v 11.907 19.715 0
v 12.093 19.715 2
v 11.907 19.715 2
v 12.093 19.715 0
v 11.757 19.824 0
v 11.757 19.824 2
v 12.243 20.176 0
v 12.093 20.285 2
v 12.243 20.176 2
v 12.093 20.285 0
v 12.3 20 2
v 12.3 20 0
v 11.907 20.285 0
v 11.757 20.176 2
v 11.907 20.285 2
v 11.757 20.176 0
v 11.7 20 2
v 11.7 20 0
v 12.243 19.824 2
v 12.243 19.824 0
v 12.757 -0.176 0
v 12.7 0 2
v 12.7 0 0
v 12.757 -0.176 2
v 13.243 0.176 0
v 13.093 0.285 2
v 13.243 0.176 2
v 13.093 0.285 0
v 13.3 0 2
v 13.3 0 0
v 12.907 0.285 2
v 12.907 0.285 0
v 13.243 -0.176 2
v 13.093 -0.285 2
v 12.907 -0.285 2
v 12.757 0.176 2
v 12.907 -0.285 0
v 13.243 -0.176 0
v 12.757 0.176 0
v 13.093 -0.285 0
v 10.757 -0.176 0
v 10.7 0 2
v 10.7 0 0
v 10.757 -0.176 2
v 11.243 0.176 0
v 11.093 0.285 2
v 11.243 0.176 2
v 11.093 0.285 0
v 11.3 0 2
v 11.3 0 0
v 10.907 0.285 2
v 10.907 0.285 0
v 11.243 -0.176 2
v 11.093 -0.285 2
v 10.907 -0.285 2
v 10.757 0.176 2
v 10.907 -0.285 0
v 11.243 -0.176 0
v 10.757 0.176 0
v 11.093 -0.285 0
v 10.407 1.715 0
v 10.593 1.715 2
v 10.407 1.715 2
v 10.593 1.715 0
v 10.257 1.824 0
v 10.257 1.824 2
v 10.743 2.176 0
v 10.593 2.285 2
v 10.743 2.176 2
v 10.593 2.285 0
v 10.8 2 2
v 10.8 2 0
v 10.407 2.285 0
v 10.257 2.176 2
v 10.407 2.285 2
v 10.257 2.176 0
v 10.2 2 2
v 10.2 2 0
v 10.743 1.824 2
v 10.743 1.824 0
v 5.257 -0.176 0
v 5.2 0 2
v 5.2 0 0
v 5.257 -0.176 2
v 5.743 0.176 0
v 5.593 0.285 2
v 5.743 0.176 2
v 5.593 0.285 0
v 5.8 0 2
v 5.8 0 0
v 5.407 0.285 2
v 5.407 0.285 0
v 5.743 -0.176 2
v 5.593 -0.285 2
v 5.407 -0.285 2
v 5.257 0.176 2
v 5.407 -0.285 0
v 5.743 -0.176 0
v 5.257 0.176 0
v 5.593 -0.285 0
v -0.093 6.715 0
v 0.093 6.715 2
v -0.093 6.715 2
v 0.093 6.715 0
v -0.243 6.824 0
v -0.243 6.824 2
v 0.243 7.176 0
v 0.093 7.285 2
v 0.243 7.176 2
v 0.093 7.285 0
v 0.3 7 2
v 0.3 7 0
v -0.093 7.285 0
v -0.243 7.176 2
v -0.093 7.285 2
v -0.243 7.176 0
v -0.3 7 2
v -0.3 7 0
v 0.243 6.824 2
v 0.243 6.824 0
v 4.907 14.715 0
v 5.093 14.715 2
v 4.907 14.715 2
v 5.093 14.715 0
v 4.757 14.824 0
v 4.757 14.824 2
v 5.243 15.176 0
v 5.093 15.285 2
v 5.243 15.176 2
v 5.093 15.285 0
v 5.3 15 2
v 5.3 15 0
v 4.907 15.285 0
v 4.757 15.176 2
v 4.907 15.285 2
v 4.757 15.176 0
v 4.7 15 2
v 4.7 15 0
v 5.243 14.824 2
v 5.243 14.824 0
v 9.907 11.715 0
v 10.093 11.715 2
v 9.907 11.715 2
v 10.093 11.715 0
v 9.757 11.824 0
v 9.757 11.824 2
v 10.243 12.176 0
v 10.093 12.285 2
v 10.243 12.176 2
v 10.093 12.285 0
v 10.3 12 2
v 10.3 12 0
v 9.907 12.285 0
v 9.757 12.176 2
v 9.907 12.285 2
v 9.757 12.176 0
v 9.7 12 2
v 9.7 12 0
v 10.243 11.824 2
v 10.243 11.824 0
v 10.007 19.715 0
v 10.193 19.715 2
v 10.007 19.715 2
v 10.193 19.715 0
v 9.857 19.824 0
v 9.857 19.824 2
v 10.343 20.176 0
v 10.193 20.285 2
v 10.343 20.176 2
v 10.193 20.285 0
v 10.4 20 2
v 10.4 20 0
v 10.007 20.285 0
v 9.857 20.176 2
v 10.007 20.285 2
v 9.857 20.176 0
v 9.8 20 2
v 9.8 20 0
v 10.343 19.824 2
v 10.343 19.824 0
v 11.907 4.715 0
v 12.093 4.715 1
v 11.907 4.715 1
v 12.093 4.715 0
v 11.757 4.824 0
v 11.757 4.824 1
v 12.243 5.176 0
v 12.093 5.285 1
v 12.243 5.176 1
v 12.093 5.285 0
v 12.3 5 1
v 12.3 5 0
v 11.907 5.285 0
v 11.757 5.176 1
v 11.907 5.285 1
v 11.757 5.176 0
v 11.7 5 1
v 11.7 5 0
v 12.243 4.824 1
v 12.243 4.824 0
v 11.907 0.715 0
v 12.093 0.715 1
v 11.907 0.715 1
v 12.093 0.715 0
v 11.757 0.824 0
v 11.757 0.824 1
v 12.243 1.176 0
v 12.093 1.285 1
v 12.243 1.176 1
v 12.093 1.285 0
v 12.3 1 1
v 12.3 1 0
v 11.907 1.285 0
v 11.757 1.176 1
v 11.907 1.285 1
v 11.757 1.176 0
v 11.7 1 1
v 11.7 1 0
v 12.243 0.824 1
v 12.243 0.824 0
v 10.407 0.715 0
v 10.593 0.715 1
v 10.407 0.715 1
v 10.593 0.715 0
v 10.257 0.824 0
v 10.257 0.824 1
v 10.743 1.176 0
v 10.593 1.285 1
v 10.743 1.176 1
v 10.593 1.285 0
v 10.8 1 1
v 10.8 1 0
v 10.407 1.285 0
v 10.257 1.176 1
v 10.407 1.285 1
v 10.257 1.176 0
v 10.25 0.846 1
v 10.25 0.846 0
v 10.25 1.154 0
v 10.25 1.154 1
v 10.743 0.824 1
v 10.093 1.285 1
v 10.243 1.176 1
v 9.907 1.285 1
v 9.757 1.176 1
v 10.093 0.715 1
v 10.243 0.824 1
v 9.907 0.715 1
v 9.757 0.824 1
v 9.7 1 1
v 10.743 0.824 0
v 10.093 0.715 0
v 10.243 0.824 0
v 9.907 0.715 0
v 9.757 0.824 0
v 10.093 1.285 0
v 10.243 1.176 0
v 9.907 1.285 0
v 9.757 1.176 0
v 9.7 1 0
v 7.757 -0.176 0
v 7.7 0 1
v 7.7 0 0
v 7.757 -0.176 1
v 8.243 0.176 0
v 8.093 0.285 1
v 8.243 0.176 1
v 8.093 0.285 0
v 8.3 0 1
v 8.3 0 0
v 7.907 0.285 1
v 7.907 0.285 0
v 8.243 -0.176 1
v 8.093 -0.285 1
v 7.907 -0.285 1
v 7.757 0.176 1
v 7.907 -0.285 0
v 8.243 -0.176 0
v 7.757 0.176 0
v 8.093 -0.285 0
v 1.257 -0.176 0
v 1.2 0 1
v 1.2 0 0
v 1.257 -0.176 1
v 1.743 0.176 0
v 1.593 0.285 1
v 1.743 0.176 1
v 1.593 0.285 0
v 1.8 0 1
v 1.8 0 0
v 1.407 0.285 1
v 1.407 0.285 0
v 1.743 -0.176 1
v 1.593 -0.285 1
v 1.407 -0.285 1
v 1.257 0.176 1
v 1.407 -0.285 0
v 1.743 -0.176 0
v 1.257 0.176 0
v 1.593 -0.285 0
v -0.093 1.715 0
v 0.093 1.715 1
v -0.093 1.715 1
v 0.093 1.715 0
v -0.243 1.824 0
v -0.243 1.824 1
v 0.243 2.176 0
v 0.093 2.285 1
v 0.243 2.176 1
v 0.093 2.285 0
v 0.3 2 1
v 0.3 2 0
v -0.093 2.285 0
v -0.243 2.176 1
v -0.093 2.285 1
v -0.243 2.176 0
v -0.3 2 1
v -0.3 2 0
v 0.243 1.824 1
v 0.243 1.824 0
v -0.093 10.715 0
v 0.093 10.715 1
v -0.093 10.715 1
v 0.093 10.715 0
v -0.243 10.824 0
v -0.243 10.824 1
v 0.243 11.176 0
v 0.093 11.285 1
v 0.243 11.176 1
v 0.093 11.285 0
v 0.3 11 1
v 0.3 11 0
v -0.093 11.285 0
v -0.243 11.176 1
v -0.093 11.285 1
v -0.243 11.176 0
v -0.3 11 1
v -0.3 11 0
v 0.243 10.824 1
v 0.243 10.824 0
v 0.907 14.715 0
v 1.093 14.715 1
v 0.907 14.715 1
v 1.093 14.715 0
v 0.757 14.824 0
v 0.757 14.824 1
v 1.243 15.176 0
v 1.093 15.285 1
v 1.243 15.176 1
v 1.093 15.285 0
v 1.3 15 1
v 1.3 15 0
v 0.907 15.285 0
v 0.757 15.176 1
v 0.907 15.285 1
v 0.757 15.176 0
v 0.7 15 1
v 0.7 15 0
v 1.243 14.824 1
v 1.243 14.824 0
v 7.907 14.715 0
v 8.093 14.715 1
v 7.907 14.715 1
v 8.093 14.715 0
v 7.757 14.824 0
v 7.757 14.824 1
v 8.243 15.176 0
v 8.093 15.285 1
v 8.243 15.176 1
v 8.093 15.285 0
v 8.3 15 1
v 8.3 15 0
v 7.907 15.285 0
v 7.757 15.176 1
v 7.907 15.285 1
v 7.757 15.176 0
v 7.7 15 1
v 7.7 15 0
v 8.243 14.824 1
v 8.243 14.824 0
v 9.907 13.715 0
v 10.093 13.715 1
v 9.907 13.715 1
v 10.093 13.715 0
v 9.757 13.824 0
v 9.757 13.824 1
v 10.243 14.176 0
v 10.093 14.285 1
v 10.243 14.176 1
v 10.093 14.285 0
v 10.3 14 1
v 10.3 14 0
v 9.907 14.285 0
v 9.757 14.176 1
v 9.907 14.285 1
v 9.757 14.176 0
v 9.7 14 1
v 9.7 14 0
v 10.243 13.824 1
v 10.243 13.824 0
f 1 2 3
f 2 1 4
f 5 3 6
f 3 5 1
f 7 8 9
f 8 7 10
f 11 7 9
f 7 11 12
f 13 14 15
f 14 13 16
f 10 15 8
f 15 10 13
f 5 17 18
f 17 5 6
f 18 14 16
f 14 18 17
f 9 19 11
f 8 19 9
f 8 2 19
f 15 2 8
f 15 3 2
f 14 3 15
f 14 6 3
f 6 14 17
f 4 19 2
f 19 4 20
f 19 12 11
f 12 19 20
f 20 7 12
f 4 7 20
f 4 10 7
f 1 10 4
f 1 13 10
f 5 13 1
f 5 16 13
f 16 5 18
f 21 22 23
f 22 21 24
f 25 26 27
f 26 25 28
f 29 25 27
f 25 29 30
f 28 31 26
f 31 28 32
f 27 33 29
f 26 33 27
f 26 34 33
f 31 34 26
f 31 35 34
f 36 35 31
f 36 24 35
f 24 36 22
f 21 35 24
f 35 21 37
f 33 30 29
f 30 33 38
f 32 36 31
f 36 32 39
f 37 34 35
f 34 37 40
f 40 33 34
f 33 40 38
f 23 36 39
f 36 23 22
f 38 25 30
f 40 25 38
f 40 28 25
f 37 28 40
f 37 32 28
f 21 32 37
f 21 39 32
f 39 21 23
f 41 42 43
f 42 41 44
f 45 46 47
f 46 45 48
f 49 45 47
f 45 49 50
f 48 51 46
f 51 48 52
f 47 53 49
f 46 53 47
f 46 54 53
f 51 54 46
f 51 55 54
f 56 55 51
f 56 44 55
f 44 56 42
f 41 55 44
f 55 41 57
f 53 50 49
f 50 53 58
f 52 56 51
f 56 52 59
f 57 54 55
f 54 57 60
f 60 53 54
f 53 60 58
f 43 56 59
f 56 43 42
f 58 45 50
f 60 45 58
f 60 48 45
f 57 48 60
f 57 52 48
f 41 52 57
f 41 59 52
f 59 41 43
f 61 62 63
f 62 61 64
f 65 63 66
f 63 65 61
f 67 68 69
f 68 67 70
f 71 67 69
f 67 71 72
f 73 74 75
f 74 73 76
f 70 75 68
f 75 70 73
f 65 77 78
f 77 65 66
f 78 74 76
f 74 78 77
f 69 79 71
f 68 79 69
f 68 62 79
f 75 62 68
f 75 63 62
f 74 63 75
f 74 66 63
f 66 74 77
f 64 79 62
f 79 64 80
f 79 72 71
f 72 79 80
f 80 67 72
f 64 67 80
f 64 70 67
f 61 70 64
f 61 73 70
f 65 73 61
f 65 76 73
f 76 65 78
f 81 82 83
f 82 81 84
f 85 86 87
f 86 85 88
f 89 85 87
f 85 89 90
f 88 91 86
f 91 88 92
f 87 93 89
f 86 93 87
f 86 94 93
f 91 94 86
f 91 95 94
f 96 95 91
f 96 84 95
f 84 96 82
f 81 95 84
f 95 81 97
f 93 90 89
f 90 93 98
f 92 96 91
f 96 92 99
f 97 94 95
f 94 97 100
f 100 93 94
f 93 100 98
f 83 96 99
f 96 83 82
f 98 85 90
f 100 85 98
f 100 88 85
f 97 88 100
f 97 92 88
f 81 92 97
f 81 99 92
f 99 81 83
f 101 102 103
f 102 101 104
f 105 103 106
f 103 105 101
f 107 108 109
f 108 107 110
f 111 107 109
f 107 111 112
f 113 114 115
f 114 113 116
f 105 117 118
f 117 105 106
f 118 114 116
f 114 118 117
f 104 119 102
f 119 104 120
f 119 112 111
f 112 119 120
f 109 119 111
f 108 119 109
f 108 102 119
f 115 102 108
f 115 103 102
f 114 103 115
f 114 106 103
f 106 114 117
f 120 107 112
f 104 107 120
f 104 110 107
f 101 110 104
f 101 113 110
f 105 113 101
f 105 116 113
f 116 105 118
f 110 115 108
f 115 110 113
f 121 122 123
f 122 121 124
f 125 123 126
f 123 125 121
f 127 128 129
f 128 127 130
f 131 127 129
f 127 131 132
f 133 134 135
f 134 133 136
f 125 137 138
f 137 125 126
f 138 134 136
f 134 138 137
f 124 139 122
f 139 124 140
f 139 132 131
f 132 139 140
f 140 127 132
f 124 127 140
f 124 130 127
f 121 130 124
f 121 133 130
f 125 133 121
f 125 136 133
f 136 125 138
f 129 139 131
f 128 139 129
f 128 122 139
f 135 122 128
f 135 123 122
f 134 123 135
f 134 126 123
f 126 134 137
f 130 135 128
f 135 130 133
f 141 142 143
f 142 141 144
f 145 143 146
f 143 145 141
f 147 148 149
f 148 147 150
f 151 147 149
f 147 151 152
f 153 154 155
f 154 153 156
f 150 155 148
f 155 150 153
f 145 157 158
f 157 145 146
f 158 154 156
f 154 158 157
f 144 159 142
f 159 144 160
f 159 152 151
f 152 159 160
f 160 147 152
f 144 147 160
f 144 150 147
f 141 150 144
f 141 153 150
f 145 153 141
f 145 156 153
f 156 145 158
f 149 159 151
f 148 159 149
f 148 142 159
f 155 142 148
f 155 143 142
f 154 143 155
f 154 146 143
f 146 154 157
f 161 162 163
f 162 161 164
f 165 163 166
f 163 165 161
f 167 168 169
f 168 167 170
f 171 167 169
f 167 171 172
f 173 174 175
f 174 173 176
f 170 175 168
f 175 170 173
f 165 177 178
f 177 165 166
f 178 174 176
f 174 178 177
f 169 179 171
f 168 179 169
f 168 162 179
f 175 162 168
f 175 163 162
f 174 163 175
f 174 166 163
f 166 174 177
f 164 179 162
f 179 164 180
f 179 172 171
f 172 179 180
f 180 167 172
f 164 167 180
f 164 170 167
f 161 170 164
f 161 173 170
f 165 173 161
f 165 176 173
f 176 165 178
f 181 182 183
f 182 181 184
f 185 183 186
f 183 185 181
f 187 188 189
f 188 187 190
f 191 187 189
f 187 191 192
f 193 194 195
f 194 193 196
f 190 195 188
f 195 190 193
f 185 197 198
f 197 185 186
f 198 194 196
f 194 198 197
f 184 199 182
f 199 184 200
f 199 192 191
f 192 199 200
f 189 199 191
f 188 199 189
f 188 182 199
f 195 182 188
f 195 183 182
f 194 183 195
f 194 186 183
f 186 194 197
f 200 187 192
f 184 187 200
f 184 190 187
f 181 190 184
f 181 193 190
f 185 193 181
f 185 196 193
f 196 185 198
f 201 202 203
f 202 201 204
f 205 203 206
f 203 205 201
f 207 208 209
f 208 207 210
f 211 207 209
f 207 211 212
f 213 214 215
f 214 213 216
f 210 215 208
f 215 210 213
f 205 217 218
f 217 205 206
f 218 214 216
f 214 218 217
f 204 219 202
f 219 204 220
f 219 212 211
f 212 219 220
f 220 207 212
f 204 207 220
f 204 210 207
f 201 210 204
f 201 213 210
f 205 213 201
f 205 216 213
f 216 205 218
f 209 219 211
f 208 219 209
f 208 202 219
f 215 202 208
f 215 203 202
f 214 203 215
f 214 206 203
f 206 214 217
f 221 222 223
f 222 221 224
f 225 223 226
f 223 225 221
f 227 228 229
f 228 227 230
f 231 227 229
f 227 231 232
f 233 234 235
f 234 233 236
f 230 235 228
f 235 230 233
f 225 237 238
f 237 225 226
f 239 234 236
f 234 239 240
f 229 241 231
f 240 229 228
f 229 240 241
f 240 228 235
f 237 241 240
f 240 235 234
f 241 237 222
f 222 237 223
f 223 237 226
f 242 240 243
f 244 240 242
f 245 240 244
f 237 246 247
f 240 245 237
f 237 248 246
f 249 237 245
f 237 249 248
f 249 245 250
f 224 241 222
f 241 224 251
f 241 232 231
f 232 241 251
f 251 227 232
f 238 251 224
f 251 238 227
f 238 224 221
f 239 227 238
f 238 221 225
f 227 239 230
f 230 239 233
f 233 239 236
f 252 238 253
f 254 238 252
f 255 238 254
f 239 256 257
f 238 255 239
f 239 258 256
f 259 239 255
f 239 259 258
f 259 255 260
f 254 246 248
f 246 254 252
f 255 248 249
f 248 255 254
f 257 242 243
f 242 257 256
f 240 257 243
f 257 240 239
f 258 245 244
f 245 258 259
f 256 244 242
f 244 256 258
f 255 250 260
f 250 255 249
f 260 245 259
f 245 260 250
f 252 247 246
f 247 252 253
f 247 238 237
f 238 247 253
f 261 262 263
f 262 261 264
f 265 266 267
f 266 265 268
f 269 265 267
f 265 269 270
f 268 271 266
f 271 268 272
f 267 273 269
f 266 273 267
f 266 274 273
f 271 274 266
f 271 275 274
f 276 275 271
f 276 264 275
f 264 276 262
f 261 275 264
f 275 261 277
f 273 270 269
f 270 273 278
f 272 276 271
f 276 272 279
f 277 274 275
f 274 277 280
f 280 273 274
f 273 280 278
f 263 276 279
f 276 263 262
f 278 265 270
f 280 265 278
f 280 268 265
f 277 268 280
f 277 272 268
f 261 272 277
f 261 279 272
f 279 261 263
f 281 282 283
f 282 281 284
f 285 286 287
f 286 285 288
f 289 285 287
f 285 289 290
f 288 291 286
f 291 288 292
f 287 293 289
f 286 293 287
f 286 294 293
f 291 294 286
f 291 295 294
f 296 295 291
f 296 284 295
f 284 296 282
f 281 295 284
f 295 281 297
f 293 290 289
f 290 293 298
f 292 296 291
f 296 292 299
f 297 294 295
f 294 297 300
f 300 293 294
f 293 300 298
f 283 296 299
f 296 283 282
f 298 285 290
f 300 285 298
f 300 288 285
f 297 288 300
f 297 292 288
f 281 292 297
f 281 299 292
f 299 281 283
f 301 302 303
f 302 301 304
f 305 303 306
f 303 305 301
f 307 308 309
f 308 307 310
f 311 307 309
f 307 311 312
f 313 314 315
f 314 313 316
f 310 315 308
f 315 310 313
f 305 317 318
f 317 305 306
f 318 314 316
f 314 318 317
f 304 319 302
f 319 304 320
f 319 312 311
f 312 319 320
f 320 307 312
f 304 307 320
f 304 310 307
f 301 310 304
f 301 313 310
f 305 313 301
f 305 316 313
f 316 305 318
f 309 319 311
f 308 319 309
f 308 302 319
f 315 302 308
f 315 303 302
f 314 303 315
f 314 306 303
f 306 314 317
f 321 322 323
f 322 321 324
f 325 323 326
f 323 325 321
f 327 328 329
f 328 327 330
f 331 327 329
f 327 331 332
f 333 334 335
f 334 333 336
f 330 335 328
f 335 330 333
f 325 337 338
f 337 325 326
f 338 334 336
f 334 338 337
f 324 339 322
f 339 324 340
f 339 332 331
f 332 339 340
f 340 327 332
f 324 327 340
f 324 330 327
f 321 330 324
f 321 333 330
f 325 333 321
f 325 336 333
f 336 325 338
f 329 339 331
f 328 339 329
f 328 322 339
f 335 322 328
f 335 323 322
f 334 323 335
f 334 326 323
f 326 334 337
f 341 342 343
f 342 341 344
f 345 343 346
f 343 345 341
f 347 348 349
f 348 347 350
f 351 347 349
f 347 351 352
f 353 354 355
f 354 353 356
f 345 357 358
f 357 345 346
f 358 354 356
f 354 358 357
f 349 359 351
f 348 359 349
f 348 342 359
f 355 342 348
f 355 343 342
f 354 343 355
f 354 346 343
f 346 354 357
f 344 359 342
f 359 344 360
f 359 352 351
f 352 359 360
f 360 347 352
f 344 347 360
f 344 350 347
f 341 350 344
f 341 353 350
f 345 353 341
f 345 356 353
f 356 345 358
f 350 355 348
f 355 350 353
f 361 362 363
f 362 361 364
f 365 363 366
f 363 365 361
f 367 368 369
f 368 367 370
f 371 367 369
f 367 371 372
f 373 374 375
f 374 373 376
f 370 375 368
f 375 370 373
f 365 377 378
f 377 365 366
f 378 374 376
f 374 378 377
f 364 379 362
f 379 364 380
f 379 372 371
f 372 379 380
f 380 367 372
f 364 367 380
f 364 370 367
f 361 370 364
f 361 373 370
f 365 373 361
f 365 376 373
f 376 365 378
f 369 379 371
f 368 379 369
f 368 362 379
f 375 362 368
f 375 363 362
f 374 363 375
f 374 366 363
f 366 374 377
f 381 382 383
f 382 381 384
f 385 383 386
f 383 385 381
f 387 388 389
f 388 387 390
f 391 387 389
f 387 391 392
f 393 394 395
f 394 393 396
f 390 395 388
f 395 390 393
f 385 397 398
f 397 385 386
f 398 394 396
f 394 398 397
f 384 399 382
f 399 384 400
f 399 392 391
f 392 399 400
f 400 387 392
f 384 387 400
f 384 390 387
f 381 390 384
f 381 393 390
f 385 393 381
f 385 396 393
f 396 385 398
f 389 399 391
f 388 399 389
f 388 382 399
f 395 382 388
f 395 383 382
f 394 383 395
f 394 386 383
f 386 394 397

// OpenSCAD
// variables
// roughly the size of straight parts of curves
fs = 0.5;

// points
// outside
p1 = [12, 20];
p2 = [12, 5];
p3 = [12, 1];
p4 = [13, 0];
p5 = [11, 0];
p6 = [10.5, 1];
p7 = [10.5, 2];
p8 = [10, 1];
p9 = [8, 0];
p10 = [5.5, 0];
p11 = [1.5, 0];
p12 = [0, 2];
p13 = [0, 7];
p14 = [0, 11];
p15 = [1, 15];
p16 = [5, 15];
p17 = [8, 15];
p18 = [10, 14];
p19 = [10, 12];
p20 = [10, 14];
p21 = [10.1, 20];

for (i=[p1, p4, p5, p7, p10, p13, p16, p19, p21]) 
    translate(i) color("red")cylinder(2, 0.3, 0.3, $fn=10);

// displaying all defining points
for (i=[p2, p3, p6, p8, p9, p11, p12, p14, p15, p17, p18, p20]) 
        translate(i) color("black")cylinder(1, 0.3, 0.3, $fn=10);

// functions and modules
function fn(a, b) = round(sqrt(pow(a[0]-b[0],2) + pow(a[1]-b[1], 2))/fs);
        
function b_pts(pts, n, idx) =
    len(pts)>2 ? 
        b_pts([for(i=[0:len(pts)-2])pts[i]], n, idx) * n*idx 
            + b_pts([for(i=[1:len(pts)-1])pts[i]], n, idx) * (1-n*idx)
        : pts[0] * n*idx 
            + pts[1] * (1-n*idx);

function b_curv(pts) =
    let (fn=fn(pts[0], pts[len(pts)-1]))
    [for (i= [0:fn]) concat(b_pts(pts, 1/fn, i))];
    

outside_points = concat(    
    b_curv([p21, p1]),
    b_curv([p19, p20, p21]),
    b_curv([p16, p17, p18, p19]),
    b_curv([p13, p14, p15, p16]),
    b_curv([p10, p11, p12, p13]),
    b_curv([p7, p8, p9, p10]),
    b_curv([p5, p6, p7]),
    b_curv([p4, p5]),
    b_curv([p1, p2, p3, p4]));
    
    polygon(points = outside_points);













   
/*
module b_curve_rainbow(pts) 
    let (idx=fn(pts[0], pts[len(pts)-1]), n = 1/idx)
    for (i= [0:idx]) 
    color([
        cos(20*i)/2 + 0.5, 
        -sin(20*i)/2 + 0.5, 
        -cos(20*i)/2 + 0.5, 
        1])
    translate(b_pts(pts, n, i)) sphere(0.65, $fn=15);

//rainbow
// outside
b_curve_rainbow([p1, p2, p3, p4]);
b_curve_rainbow([p4, p5]);
b_curve_rainbow([p5, p6, p7]);
b_curve_rainbow([p7, p8, p9, p10]);
b_curve_rainbow([p10, p11, p12, p13]);
b_curve_rainbow([p13, p14, p15, p16]);
b_curve_rainbow([p16, p17, p18, p19]);
b_curve_rainbow([p19, p20, p21]);
b_curve_rainbow([p21, p1]);
// inside
b_curve_rainbow([p22, p23, p24, p25]);
b_curve_rainbow([p25, p26, p27, p28]);
b_curve_rainbow([p28, p29, p30, p31]);
b_curve_rainbow([p31, p32, p33, p22]);*/
